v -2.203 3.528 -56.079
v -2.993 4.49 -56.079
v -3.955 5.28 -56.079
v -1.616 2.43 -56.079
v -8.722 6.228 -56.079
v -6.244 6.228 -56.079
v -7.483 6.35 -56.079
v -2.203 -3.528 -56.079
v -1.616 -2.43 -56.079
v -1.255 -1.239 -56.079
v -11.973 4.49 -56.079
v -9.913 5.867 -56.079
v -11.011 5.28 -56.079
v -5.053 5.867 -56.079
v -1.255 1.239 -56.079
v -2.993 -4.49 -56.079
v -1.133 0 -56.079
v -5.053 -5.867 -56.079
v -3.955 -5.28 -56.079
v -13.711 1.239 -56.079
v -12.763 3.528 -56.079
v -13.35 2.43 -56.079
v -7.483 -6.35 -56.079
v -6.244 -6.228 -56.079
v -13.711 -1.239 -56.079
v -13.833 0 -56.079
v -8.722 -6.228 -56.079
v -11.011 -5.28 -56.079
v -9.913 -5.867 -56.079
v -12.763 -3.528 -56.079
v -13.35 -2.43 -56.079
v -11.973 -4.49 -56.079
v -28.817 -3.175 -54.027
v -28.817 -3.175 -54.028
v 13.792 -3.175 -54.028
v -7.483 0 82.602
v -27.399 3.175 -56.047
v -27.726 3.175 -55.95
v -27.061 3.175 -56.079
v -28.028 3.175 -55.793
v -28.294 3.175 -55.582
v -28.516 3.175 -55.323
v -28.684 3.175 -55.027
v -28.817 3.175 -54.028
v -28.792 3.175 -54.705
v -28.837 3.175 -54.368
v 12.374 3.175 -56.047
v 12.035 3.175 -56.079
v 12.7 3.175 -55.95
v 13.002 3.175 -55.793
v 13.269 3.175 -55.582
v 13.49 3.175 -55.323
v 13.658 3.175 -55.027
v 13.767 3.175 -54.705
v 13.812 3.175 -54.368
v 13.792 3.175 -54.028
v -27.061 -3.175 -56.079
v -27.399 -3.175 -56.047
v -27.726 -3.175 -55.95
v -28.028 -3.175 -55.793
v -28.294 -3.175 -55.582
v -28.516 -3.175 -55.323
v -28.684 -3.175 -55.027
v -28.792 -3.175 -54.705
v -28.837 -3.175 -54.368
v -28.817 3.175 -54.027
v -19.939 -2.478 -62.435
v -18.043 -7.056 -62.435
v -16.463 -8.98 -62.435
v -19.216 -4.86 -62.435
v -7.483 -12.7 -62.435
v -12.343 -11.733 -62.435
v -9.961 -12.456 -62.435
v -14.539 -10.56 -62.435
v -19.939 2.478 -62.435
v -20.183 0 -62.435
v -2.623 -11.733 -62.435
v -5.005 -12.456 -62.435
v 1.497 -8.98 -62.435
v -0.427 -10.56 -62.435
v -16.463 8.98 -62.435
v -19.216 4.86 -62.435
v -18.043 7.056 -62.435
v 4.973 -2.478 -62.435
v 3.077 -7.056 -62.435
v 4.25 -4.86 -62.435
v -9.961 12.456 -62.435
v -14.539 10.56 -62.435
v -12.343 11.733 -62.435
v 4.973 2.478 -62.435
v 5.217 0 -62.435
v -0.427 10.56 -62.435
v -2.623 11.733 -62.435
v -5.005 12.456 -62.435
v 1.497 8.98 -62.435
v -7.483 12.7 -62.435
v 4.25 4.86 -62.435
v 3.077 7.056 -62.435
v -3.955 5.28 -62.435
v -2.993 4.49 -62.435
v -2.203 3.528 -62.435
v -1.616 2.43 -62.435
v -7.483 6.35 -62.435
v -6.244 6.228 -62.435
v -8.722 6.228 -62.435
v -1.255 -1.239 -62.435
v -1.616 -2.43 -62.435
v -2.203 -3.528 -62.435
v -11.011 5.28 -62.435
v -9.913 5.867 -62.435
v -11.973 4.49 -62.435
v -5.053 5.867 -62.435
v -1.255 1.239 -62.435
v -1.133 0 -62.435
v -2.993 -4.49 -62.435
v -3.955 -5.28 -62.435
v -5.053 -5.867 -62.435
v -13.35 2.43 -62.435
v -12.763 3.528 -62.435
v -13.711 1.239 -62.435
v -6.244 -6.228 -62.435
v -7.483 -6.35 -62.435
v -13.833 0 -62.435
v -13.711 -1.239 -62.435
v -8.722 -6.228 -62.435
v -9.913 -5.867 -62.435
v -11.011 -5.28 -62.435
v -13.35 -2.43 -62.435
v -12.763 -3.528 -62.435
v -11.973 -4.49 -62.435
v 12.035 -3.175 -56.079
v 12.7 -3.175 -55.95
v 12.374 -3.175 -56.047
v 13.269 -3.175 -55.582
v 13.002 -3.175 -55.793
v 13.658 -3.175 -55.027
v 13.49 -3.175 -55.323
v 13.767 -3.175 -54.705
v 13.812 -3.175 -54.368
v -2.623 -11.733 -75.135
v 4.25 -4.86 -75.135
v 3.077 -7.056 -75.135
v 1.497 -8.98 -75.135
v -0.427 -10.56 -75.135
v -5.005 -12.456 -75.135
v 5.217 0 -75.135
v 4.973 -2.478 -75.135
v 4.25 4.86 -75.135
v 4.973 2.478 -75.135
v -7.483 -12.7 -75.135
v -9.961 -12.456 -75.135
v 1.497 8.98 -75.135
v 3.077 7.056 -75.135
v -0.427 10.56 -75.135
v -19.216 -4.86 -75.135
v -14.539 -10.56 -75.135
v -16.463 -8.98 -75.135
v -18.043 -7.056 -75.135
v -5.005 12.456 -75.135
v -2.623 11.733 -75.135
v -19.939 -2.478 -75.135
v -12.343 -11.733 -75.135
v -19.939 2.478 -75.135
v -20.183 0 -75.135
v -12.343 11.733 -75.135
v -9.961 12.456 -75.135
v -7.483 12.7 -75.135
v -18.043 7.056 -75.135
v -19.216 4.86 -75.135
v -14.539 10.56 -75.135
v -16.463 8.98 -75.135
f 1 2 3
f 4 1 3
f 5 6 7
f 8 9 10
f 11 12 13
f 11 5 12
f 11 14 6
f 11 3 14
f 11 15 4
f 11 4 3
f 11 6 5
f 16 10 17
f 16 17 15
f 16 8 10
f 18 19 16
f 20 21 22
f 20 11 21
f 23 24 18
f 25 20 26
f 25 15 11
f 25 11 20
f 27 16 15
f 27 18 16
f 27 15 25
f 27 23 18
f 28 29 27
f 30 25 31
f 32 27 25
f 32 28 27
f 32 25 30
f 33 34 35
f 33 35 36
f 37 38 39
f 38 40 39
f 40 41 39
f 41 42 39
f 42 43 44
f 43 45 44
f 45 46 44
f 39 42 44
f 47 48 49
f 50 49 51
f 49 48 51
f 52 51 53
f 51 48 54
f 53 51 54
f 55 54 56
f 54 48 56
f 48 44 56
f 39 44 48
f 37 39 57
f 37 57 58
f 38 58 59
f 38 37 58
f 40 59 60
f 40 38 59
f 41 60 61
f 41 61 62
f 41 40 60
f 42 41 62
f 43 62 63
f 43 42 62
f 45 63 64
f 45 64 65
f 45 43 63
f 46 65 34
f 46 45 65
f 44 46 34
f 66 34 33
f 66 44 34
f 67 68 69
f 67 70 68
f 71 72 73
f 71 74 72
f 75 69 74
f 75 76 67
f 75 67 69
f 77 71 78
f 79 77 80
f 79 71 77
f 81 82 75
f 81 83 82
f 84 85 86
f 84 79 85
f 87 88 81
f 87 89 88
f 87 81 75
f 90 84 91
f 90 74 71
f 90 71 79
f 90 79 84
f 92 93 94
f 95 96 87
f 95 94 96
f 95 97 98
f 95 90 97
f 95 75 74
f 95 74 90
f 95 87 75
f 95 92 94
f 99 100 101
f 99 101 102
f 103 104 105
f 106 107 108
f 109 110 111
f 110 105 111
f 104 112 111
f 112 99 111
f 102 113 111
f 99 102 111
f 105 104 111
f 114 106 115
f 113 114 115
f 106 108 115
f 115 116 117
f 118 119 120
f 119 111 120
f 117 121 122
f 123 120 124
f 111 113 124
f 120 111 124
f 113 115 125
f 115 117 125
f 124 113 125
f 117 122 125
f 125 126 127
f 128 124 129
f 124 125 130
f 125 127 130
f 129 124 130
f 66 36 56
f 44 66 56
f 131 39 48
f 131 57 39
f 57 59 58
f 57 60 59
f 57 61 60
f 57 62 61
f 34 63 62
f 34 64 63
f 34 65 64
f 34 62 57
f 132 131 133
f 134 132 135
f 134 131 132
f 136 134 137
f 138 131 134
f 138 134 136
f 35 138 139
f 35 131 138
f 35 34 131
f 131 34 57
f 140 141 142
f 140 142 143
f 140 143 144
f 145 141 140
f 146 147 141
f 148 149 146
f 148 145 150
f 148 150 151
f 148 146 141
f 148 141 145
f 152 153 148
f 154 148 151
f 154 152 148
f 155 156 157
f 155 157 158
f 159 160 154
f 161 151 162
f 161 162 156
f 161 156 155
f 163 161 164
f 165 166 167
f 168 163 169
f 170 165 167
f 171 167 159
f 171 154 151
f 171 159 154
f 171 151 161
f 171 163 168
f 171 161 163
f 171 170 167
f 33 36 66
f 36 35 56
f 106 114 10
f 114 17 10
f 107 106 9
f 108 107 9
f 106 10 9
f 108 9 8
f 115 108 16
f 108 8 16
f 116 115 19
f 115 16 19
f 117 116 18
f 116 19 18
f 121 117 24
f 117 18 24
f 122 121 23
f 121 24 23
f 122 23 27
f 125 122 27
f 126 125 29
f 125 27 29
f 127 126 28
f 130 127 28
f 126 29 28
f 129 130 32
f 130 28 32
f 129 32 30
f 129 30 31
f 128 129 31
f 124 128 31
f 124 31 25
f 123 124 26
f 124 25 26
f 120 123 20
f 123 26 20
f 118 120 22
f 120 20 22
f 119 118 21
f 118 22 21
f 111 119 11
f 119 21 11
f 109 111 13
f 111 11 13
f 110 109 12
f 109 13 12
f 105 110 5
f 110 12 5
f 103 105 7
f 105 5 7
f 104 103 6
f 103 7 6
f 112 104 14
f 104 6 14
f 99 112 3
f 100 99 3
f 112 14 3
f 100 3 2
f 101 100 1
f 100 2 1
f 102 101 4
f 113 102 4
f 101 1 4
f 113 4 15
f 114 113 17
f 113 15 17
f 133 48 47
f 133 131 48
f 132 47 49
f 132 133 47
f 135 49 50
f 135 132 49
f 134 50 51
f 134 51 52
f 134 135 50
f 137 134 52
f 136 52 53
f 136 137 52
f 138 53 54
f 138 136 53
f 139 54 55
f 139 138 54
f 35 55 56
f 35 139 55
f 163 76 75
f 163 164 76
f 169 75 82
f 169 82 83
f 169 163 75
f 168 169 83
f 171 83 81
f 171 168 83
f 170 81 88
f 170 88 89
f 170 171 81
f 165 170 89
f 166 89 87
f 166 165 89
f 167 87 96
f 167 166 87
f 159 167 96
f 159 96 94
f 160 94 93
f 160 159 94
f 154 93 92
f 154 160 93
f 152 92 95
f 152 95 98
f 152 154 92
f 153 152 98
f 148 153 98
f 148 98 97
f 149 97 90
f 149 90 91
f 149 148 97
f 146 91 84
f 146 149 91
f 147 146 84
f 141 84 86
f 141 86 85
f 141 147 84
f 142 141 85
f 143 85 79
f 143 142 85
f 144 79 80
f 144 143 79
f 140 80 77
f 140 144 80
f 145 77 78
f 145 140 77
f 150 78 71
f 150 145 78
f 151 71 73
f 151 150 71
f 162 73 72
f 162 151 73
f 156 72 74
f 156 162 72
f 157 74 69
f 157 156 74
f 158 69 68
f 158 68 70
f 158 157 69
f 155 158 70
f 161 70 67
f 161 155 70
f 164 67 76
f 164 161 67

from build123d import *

# Parameters (mm, degrees)
F0_W     = 6.35
F0_H     = 6.355425
F2_DEPTH = 3.175
F3_R     = 1.778
F5_DEPTH = 31.75


with BuildPart() as f1:
    # F0 (on Front) → F1 (revolve)
    with BuildSketch(Plane.XZ):
        Polygon((-20.18295, -62.434783), (-20.18295, -75.134783), (-7.48295, -75.134783), (-7.48295, -62.434783), (-13.83295, -62.434783), align=None)
        with Locations((-4.30795, -59.25707)):
            Rectangle(F0_W, F0_H)
    revolve(axis=Axis((-7.48295, 0, -65.607071), (0, 0, -1)))


with BuildPart() as f2:
    # F0 (on Front) → F2 (new body, symmetric)
    with BuildSketch(Plane.XZ):
        Polygon((-29.137837, -56.079358), (-13.83295, -56.079358), (-7.48295, -56.079358), (-1.13295, -56.079358), (14.111359, -56.079358), (-7.48295, 82.601726), align=None)
    extrude(amount=F2_DEPTH, both=True)

    # F3
    f3_edges = [f2.edges().sort_by_distance(p)[0] for p in [
        (-29.137837, 0, -56.079358),
        (14.111359, 0, -56.079358),
    ]]
    fillet(f3_edges, radius=F3_R)

    # F4 (on Right) → F5 (cut, symmetric)
    with BuildSketch(Plane.YZ):
        Polygon((-3.175, 82.601726), (-3.175, -54.027798), (0, 82.601726), align=None)
        Polygon((3.175, 82.601726), (0, 82.601726), (3.175, -54.027798), align=None)
    extrude(amount=F5_DEPTH, both=True, mode=Mode.SUBTRACT)


solid = Compound([f1.part, f2.part])
